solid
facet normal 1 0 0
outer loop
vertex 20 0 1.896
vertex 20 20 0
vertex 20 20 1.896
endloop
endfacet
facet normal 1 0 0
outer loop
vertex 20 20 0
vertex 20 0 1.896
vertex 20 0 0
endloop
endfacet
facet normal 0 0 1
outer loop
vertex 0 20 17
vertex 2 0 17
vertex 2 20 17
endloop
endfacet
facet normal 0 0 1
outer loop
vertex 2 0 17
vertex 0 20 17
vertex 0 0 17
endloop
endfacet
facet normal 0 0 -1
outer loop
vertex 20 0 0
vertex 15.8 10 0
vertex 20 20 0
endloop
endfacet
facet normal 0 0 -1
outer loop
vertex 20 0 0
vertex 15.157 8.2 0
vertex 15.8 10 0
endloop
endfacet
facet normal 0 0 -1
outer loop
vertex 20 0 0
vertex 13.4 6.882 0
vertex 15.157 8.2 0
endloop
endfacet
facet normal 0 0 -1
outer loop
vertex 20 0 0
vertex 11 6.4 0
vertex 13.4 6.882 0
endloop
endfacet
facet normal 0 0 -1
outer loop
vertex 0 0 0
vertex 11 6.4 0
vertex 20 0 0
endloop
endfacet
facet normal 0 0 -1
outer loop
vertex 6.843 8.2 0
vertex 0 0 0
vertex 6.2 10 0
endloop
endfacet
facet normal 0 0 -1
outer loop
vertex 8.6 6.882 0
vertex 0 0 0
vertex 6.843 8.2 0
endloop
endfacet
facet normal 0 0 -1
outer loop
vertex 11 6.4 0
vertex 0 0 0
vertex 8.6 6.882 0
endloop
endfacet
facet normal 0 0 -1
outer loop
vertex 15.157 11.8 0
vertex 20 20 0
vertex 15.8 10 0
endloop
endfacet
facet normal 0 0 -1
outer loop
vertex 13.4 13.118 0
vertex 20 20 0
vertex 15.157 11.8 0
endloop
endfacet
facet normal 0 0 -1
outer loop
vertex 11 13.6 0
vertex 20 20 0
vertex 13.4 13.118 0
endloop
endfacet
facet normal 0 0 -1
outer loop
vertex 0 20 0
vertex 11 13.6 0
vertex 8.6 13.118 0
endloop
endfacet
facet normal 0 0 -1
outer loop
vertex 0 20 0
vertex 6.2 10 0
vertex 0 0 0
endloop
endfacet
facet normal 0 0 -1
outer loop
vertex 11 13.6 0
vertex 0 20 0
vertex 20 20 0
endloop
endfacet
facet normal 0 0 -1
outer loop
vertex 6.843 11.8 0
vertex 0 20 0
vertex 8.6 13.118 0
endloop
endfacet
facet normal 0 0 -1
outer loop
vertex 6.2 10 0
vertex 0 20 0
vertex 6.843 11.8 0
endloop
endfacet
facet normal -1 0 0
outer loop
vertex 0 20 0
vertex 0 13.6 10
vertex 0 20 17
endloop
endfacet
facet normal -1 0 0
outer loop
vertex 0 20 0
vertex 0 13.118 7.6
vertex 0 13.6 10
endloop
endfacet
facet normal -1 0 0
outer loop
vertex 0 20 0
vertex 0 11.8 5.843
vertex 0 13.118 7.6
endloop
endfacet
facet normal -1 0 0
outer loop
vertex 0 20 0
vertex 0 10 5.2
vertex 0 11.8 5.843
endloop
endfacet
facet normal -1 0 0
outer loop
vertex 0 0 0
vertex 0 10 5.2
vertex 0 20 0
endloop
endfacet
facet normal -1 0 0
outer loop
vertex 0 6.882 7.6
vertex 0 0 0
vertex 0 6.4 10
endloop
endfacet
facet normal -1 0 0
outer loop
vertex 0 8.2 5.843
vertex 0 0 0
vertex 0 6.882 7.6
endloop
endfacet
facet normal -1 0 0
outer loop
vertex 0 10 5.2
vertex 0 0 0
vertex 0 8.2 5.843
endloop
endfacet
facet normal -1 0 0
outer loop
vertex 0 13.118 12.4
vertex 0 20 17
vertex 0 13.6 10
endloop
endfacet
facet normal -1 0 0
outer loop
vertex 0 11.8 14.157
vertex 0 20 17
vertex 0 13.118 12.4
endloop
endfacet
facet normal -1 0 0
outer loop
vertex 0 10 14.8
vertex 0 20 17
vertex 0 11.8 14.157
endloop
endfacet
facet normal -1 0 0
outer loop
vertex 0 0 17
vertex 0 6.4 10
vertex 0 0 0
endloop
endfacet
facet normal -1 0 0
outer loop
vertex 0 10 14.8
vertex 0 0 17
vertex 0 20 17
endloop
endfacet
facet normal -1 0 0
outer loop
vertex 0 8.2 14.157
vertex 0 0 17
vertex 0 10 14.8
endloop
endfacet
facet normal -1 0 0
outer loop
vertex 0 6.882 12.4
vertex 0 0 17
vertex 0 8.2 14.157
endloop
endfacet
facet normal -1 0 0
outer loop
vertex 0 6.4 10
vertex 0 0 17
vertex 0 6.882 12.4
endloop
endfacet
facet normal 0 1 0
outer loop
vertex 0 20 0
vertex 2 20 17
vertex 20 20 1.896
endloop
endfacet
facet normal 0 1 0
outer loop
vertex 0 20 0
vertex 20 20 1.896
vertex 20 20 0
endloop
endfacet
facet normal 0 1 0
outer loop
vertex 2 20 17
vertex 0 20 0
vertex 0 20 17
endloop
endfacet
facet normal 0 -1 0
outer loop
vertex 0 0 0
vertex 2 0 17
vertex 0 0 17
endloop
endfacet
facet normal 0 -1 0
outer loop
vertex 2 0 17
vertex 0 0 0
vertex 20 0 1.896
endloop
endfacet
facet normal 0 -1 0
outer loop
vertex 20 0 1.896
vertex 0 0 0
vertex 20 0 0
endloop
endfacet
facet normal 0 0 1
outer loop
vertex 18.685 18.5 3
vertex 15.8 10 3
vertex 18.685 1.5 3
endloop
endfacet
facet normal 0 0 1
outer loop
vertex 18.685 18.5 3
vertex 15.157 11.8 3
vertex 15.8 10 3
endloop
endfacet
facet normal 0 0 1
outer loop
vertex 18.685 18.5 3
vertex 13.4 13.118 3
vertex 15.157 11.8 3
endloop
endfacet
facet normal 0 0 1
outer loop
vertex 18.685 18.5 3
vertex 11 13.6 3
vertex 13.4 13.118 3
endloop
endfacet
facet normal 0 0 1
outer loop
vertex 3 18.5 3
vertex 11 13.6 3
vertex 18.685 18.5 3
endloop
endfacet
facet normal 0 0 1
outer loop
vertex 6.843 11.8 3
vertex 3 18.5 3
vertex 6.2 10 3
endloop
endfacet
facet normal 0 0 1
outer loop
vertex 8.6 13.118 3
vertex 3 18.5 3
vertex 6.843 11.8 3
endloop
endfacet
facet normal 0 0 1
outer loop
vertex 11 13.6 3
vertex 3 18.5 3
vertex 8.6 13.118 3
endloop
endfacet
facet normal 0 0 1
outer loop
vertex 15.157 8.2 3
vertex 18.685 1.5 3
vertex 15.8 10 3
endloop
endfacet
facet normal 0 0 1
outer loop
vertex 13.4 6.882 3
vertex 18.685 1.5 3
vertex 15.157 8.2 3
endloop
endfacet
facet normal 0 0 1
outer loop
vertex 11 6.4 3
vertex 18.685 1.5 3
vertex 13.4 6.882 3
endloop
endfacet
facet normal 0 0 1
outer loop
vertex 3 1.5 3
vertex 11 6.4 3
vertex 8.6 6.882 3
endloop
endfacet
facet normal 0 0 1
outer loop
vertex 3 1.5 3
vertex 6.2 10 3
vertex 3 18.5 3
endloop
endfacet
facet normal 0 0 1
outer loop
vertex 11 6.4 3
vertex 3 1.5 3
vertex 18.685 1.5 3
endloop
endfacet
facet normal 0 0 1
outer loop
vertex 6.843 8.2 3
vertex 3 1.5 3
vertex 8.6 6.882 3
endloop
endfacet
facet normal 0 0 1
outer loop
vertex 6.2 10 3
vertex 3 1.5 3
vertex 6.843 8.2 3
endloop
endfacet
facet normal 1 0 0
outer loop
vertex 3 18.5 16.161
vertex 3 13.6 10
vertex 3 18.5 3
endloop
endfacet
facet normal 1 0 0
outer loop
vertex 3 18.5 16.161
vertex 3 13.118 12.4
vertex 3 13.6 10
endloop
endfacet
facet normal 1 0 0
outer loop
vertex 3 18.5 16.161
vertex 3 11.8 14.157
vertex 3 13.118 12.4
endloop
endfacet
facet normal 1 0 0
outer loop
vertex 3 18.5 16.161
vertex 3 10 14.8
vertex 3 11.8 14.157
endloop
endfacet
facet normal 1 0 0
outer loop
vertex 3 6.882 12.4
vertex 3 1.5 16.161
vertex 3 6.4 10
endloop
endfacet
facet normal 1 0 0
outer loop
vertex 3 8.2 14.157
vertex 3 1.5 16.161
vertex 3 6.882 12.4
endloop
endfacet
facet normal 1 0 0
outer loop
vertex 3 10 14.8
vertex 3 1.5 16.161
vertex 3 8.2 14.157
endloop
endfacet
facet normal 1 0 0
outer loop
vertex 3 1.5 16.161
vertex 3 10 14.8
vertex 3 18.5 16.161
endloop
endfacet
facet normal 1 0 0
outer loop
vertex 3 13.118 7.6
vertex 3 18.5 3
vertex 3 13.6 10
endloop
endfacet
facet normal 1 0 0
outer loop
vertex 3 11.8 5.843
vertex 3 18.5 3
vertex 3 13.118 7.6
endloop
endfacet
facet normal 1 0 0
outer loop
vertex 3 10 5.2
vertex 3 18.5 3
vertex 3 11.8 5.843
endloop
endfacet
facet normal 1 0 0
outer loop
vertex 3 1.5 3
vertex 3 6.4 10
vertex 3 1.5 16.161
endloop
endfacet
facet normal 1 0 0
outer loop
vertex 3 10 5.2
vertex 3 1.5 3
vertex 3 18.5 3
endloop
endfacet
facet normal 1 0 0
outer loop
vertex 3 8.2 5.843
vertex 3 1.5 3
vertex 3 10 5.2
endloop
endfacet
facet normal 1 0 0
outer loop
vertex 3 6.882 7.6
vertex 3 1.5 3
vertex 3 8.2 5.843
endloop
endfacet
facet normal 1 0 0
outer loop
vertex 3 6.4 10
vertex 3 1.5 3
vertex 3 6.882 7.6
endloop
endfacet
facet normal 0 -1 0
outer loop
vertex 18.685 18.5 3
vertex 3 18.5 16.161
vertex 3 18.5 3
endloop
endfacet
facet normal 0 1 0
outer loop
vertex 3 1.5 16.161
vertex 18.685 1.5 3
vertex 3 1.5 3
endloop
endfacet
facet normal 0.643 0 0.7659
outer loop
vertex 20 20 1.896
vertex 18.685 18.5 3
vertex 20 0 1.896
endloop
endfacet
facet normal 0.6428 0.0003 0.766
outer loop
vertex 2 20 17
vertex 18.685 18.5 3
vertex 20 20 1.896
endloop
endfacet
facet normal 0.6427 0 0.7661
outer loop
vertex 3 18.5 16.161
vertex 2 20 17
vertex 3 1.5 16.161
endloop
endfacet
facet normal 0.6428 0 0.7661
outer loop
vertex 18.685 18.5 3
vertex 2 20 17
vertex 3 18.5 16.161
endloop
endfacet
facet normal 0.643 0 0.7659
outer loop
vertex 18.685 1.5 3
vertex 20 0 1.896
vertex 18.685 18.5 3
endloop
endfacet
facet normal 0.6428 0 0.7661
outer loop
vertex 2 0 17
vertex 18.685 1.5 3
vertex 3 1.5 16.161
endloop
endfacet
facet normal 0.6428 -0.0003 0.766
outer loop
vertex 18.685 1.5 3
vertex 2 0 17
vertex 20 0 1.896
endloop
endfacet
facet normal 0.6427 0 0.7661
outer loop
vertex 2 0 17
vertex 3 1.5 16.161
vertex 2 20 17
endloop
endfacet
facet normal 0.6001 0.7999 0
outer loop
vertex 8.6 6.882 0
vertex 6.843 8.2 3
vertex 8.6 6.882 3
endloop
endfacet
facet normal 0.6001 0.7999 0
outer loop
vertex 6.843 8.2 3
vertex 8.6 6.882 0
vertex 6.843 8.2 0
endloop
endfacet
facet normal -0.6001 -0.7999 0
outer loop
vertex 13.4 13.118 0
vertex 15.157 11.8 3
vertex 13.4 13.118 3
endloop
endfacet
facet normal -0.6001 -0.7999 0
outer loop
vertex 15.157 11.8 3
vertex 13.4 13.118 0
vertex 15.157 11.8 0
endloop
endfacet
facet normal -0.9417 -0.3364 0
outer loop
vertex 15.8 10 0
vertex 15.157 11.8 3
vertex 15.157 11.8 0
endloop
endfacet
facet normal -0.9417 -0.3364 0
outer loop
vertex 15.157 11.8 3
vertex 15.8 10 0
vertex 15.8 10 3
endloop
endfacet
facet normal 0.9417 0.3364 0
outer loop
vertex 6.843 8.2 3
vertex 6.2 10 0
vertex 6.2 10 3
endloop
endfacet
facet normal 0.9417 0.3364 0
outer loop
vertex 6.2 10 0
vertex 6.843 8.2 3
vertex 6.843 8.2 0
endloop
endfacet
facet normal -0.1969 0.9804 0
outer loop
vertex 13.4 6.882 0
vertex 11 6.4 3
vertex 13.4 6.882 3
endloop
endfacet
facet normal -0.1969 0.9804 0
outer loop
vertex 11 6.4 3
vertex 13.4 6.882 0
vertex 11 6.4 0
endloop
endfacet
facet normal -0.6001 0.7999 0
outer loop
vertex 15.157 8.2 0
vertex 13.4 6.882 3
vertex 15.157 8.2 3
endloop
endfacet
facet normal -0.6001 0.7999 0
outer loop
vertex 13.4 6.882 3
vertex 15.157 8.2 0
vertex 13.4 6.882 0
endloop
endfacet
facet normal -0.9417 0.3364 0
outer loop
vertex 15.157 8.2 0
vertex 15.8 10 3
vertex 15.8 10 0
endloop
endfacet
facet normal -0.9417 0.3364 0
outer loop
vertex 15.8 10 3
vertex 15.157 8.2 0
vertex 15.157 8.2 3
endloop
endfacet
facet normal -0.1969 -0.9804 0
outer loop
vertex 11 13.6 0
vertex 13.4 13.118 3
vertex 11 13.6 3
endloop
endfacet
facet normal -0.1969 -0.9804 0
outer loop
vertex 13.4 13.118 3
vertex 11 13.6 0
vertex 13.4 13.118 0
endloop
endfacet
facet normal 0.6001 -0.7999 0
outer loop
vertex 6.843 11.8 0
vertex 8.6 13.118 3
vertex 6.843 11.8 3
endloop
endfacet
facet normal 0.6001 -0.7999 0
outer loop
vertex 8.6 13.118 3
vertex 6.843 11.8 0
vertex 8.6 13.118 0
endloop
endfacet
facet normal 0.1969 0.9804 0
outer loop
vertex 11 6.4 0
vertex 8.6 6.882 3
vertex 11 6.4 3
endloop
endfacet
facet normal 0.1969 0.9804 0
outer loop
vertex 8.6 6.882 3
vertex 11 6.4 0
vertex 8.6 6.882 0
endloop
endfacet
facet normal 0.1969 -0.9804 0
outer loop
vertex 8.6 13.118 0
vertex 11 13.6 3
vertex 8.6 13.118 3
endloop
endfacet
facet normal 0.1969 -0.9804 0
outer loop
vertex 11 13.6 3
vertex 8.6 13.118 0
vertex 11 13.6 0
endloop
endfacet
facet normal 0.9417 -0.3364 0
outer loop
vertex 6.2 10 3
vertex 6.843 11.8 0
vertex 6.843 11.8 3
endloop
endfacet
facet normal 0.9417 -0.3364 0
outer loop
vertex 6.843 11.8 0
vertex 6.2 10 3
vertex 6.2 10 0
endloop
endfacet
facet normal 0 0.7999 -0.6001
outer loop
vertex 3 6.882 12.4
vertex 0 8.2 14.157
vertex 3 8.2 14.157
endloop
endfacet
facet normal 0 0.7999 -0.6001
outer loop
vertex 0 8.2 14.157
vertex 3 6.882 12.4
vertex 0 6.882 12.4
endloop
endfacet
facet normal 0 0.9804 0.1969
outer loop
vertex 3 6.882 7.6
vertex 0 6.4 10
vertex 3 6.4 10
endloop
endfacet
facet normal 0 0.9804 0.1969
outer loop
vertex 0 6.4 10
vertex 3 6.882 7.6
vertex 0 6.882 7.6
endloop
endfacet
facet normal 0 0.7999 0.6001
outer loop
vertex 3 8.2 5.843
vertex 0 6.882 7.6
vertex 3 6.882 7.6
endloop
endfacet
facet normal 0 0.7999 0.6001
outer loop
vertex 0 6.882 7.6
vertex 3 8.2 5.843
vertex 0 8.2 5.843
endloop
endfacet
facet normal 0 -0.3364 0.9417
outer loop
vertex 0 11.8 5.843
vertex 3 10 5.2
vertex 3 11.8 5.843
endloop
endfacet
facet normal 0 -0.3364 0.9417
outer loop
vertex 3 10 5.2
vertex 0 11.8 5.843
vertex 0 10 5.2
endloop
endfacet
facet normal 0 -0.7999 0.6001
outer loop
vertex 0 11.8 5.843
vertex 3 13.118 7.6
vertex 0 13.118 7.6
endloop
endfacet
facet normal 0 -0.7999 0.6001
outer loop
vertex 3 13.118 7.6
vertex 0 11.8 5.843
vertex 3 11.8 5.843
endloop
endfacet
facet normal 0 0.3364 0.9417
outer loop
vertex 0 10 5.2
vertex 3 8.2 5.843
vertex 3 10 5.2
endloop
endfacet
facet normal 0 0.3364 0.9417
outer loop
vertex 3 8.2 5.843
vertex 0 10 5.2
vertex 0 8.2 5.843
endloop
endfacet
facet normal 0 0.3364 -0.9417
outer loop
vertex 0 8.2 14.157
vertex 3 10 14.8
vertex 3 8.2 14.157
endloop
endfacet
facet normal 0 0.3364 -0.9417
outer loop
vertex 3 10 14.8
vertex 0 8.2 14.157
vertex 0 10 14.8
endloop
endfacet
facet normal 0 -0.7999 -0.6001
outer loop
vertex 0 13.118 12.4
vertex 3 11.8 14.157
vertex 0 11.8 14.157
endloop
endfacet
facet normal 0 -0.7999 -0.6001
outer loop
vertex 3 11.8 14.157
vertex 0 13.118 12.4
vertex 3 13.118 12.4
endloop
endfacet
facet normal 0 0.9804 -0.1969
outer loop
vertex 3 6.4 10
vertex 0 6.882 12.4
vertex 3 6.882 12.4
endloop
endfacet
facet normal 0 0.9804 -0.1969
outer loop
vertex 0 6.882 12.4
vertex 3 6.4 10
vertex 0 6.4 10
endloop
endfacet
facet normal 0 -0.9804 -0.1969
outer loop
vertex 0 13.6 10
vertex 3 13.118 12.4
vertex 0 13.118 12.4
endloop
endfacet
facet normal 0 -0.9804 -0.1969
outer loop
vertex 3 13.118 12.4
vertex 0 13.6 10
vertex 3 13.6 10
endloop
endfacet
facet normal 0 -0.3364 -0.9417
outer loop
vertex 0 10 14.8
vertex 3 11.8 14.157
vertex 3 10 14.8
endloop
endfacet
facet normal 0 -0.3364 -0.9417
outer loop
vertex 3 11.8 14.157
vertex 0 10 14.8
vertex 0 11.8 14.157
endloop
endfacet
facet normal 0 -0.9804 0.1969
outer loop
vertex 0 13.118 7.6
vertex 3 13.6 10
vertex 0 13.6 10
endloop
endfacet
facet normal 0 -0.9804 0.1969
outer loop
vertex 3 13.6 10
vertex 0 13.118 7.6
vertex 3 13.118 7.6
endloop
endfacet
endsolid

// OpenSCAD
module angle_bracket(){
    render()difference(){
        
        cube([20,20,17]);
        translate([3,1.5,3])color("green")cube([17,17,14]);
        translate([2,0,17])color("yellow")rotate(a=40,v=[0,1,0])cube([25,25,20]);
        
        
          translate([11,10,0])scale([1.6,1.2])cylinder(h=10,r=3,$fn=12);
    
    translate([0,10,10])rotate(a=90, v=[0,1,0])scale([1.6,1.2])cylinder(h=10,r=3,$fn=12);
    }
    
  
    
}

angle_bracket();
